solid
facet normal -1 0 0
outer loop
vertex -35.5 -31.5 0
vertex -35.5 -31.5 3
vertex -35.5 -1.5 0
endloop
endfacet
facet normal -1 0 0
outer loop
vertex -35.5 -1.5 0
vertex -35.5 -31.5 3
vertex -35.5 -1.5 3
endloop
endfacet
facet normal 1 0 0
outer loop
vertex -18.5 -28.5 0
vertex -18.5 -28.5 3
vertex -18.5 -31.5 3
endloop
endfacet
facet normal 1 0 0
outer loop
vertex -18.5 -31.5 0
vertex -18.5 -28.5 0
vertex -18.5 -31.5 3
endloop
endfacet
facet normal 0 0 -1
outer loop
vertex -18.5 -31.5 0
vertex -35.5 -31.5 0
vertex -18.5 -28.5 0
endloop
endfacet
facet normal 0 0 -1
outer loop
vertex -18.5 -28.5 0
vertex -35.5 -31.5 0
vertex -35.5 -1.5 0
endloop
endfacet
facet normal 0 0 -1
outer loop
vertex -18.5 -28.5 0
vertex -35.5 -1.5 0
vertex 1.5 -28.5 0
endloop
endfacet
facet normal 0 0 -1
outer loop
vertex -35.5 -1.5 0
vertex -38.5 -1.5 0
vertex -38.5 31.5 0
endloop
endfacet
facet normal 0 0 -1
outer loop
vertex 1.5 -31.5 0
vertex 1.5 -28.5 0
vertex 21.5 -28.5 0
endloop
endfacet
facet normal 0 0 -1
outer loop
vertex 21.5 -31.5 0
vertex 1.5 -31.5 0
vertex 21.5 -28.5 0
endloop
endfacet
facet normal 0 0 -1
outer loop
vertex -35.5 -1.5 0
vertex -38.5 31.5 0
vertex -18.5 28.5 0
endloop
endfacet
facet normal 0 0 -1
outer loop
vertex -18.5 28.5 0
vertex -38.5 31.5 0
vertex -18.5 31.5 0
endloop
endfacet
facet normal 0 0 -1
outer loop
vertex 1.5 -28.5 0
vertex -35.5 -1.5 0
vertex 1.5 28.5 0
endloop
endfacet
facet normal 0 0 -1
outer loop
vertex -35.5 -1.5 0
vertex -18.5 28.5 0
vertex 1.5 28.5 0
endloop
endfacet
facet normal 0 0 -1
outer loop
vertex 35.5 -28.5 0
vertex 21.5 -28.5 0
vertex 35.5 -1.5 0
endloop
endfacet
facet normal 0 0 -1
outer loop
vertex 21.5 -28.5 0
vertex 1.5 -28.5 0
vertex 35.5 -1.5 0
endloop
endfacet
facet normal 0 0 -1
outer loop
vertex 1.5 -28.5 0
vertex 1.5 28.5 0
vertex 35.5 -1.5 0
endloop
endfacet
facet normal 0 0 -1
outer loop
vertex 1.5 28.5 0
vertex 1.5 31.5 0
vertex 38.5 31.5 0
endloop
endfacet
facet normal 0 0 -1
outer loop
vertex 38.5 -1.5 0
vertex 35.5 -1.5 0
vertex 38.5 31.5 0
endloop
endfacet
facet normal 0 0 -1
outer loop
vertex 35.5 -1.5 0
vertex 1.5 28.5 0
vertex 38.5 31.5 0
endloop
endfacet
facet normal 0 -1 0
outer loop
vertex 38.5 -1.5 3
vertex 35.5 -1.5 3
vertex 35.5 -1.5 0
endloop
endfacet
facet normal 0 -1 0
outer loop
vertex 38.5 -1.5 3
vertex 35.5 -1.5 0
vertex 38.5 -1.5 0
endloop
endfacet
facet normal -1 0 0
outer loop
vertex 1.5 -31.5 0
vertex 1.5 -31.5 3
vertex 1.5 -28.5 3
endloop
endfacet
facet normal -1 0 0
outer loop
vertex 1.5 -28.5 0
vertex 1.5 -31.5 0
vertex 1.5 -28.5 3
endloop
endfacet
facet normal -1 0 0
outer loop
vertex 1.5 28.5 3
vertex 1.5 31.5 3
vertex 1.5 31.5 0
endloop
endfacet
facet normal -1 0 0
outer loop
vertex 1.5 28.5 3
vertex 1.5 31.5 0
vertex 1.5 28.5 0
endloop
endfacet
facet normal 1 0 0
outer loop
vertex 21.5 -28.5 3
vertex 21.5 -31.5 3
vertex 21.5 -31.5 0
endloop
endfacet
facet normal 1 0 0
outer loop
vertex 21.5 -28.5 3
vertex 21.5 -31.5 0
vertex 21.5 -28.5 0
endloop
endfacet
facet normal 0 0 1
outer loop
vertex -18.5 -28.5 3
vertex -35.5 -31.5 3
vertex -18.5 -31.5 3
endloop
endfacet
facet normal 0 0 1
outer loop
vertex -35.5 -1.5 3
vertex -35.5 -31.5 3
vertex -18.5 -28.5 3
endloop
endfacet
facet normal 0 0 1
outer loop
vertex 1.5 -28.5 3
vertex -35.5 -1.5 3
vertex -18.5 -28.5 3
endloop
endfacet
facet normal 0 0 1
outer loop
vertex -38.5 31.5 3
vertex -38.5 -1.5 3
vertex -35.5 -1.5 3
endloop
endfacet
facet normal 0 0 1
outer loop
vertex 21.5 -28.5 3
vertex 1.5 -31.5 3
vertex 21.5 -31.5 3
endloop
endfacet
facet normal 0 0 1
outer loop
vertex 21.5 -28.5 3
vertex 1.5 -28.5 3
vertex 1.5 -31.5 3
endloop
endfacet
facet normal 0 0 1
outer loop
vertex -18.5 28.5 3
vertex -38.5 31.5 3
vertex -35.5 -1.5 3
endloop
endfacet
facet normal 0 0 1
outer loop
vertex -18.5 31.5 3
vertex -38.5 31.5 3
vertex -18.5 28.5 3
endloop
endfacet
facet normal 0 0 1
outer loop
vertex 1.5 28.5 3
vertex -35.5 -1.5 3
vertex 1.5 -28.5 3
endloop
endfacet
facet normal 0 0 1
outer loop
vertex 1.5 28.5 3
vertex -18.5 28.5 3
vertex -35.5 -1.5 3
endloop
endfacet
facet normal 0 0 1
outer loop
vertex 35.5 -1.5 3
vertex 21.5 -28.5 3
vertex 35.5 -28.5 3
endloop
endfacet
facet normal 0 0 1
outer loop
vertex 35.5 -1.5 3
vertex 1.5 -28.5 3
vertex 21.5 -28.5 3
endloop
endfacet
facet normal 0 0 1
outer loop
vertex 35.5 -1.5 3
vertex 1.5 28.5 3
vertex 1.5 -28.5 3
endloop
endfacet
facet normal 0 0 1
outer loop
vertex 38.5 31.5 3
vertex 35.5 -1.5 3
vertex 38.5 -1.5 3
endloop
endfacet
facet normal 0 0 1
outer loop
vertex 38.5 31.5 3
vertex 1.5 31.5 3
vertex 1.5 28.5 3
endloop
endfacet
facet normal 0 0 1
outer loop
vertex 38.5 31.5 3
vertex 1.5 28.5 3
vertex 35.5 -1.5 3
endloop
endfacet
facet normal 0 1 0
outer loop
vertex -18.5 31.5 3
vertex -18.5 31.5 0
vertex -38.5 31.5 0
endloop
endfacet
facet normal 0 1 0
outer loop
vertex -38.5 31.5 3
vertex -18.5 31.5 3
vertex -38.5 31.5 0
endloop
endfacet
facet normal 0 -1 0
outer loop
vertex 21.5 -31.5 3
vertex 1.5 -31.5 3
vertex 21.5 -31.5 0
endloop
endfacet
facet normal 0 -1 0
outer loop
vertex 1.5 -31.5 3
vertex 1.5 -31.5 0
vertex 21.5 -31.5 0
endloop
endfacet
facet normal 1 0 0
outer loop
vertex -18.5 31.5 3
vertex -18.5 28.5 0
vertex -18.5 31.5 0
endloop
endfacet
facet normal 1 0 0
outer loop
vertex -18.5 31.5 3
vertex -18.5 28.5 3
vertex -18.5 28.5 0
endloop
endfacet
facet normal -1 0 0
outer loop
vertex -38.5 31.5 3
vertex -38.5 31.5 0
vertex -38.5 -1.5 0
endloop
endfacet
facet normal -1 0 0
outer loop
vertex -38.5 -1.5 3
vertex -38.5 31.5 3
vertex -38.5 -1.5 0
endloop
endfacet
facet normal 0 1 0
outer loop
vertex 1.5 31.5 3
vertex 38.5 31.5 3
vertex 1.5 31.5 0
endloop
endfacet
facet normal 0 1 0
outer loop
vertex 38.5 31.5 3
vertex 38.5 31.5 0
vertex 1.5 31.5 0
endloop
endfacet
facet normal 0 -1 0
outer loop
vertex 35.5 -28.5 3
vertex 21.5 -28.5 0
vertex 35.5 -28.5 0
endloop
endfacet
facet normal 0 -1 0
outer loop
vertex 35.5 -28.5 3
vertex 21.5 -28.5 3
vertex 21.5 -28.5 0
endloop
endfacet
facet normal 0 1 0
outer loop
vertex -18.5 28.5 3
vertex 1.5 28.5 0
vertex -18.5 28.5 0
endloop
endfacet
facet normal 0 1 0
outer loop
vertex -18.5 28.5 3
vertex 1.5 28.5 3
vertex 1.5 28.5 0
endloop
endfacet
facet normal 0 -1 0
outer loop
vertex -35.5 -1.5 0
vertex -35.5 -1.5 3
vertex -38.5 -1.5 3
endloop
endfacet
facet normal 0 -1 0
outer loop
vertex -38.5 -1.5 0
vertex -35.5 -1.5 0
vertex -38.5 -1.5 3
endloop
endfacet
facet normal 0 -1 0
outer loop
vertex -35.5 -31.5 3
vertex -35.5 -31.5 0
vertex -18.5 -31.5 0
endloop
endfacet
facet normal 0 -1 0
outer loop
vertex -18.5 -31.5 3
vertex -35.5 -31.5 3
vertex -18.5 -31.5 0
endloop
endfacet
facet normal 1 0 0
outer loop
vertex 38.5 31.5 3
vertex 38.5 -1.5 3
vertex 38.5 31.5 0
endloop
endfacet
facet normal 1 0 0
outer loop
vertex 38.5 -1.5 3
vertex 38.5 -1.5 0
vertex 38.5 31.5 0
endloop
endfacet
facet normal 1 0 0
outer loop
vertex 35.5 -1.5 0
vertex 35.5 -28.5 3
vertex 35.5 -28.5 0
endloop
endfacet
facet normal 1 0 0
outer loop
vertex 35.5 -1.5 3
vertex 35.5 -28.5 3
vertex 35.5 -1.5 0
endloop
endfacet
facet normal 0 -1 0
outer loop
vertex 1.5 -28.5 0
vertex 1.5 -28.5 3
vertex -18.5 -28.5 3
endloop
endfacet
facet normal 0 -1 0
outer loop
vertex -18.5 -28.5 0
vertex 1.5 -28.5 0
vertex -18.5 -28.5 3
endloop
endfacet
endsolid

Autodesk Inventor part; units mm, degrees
ref_plane "YZ Plane" through (0, 0, 0) normal (1, 0, 0) x (0, 1, 0)
ref_plane "XZ Plane" through (0, 0, 0) normal (0, 1, 0) x (-1, 0, 0)
ref_plane "XY Plane" through (0, 0, 0) normal (0, 0, 1) x (1, 0, 0)
sketch "Sketch1" plane through (0, 0, 0) normal (0, 0, 1) x (1, 0, 0)
  line L0 (-38.5, -31.5) -> (38.5, -31.5)
  line L1 (38.5, -31.5) -> (38.5, 31.5)
  line L2 (38.5, 31.5) -> (-38.5, 31.5)
  line L3 (-38.5, 31.5) -> (-38.5, -31.5)
  line L4 (-38.5, -31.5) -> (38.5, 31.5) construction
  line L5 (38.5, -31.5) -> (-38.5, 31.5) construction
  point P0 (0, 0)
  dimension "d0" = 77
  dimension "d1" = 63
extrude "Extrusion1" add sketch "Sketch1" along normal blind 3
sketch "Sketch2" plane through (0, 0, 3) normal (0, 0, 1) x (1, 0, 0)
  line L0 (-38.5, 31.5) -> (-38.5, -31.5) projected
  line L1 (-38.5, -31.5) -> (-35.5, -31.5)
  line L2 (-35.5, -31.5) -> (-35.5, -1.5)
  line L3 (-35.5, -1.5) -> (-38.5, -1.5)
  line L4 (-38.5, -1.5) -> (-38.5, -31.5)
  line L5 (-38.5, -31.5) -> (38.5, -31.5) projected
  line L6 (38.5, -31.5) -> (35.5, -31.5)
  line L7 (35.5, -31.5) -> (35.5, -1.5)
  line L8 (35.5, -1.5) -> (38.5, -1.5)
  line L9 (38.5, -1.5) -> (38.5, -31.5)
  line L10 (-18.5, -31.5) -> (1.5, -31.5)
  line L11 (1.5, -31.5) -> (1.5, -28.5)
  line L12 (1.5, -28.5) -> (-18.5, -28.5)
  line L13 (-18.5, -28.5) -> (-18.5, -31.5)
  line L14 (35.5, -31.5) -> (21.5, -31.5)
  line L15 (21.5, -31.5) -> (21.5, -28.5)
  line L16 (21.5, -28.5) -> (35.5, -28.5)
  line L17 (35.5, -28.5) -> (35.5, -31.5)
  point P0 (0, 0)
  dimension "d4" = 3
  dimension "d5" = 30
  dimension "d6" = 3
  dimension "d7" = 30
  dimension "d8" = 20
  dimension "d9" = 3
  dimension "d10" = 20
  dimension "d11" = 3
  dimension "d12" = 20
extrude "Extrusion2" cut sketch "Sketch2" against normal through all
sketch "Sketch3" plane through (0, 0, 3) normal (0, 0, 1) x (1, 0, 0)
  line L0 (38.5, 31.5) -> (-38.5, 31.5) projected
  line L1 (-18.5, 31.5) -> (1.5, 31.5)
  line L2 (1.5, 31.5) -> (1.5, 28.5)
  line L3 (1.5, 28.5) -> (-18.5, 28.5)
  line L4 (-18.5, 28.5) -> (-18.5, 31.5)
  line L5 (-38.5, 31.5) -> (-38.5, -1.5) projected
  point P0 (0, 0)
  dimension "d15" = 20
  dimension "d16" = 3
  dimension "d17" = 20
extrude "Extrusion3" cut sketch "Sketch3" against normal blind 3
properties part number "front_left"
